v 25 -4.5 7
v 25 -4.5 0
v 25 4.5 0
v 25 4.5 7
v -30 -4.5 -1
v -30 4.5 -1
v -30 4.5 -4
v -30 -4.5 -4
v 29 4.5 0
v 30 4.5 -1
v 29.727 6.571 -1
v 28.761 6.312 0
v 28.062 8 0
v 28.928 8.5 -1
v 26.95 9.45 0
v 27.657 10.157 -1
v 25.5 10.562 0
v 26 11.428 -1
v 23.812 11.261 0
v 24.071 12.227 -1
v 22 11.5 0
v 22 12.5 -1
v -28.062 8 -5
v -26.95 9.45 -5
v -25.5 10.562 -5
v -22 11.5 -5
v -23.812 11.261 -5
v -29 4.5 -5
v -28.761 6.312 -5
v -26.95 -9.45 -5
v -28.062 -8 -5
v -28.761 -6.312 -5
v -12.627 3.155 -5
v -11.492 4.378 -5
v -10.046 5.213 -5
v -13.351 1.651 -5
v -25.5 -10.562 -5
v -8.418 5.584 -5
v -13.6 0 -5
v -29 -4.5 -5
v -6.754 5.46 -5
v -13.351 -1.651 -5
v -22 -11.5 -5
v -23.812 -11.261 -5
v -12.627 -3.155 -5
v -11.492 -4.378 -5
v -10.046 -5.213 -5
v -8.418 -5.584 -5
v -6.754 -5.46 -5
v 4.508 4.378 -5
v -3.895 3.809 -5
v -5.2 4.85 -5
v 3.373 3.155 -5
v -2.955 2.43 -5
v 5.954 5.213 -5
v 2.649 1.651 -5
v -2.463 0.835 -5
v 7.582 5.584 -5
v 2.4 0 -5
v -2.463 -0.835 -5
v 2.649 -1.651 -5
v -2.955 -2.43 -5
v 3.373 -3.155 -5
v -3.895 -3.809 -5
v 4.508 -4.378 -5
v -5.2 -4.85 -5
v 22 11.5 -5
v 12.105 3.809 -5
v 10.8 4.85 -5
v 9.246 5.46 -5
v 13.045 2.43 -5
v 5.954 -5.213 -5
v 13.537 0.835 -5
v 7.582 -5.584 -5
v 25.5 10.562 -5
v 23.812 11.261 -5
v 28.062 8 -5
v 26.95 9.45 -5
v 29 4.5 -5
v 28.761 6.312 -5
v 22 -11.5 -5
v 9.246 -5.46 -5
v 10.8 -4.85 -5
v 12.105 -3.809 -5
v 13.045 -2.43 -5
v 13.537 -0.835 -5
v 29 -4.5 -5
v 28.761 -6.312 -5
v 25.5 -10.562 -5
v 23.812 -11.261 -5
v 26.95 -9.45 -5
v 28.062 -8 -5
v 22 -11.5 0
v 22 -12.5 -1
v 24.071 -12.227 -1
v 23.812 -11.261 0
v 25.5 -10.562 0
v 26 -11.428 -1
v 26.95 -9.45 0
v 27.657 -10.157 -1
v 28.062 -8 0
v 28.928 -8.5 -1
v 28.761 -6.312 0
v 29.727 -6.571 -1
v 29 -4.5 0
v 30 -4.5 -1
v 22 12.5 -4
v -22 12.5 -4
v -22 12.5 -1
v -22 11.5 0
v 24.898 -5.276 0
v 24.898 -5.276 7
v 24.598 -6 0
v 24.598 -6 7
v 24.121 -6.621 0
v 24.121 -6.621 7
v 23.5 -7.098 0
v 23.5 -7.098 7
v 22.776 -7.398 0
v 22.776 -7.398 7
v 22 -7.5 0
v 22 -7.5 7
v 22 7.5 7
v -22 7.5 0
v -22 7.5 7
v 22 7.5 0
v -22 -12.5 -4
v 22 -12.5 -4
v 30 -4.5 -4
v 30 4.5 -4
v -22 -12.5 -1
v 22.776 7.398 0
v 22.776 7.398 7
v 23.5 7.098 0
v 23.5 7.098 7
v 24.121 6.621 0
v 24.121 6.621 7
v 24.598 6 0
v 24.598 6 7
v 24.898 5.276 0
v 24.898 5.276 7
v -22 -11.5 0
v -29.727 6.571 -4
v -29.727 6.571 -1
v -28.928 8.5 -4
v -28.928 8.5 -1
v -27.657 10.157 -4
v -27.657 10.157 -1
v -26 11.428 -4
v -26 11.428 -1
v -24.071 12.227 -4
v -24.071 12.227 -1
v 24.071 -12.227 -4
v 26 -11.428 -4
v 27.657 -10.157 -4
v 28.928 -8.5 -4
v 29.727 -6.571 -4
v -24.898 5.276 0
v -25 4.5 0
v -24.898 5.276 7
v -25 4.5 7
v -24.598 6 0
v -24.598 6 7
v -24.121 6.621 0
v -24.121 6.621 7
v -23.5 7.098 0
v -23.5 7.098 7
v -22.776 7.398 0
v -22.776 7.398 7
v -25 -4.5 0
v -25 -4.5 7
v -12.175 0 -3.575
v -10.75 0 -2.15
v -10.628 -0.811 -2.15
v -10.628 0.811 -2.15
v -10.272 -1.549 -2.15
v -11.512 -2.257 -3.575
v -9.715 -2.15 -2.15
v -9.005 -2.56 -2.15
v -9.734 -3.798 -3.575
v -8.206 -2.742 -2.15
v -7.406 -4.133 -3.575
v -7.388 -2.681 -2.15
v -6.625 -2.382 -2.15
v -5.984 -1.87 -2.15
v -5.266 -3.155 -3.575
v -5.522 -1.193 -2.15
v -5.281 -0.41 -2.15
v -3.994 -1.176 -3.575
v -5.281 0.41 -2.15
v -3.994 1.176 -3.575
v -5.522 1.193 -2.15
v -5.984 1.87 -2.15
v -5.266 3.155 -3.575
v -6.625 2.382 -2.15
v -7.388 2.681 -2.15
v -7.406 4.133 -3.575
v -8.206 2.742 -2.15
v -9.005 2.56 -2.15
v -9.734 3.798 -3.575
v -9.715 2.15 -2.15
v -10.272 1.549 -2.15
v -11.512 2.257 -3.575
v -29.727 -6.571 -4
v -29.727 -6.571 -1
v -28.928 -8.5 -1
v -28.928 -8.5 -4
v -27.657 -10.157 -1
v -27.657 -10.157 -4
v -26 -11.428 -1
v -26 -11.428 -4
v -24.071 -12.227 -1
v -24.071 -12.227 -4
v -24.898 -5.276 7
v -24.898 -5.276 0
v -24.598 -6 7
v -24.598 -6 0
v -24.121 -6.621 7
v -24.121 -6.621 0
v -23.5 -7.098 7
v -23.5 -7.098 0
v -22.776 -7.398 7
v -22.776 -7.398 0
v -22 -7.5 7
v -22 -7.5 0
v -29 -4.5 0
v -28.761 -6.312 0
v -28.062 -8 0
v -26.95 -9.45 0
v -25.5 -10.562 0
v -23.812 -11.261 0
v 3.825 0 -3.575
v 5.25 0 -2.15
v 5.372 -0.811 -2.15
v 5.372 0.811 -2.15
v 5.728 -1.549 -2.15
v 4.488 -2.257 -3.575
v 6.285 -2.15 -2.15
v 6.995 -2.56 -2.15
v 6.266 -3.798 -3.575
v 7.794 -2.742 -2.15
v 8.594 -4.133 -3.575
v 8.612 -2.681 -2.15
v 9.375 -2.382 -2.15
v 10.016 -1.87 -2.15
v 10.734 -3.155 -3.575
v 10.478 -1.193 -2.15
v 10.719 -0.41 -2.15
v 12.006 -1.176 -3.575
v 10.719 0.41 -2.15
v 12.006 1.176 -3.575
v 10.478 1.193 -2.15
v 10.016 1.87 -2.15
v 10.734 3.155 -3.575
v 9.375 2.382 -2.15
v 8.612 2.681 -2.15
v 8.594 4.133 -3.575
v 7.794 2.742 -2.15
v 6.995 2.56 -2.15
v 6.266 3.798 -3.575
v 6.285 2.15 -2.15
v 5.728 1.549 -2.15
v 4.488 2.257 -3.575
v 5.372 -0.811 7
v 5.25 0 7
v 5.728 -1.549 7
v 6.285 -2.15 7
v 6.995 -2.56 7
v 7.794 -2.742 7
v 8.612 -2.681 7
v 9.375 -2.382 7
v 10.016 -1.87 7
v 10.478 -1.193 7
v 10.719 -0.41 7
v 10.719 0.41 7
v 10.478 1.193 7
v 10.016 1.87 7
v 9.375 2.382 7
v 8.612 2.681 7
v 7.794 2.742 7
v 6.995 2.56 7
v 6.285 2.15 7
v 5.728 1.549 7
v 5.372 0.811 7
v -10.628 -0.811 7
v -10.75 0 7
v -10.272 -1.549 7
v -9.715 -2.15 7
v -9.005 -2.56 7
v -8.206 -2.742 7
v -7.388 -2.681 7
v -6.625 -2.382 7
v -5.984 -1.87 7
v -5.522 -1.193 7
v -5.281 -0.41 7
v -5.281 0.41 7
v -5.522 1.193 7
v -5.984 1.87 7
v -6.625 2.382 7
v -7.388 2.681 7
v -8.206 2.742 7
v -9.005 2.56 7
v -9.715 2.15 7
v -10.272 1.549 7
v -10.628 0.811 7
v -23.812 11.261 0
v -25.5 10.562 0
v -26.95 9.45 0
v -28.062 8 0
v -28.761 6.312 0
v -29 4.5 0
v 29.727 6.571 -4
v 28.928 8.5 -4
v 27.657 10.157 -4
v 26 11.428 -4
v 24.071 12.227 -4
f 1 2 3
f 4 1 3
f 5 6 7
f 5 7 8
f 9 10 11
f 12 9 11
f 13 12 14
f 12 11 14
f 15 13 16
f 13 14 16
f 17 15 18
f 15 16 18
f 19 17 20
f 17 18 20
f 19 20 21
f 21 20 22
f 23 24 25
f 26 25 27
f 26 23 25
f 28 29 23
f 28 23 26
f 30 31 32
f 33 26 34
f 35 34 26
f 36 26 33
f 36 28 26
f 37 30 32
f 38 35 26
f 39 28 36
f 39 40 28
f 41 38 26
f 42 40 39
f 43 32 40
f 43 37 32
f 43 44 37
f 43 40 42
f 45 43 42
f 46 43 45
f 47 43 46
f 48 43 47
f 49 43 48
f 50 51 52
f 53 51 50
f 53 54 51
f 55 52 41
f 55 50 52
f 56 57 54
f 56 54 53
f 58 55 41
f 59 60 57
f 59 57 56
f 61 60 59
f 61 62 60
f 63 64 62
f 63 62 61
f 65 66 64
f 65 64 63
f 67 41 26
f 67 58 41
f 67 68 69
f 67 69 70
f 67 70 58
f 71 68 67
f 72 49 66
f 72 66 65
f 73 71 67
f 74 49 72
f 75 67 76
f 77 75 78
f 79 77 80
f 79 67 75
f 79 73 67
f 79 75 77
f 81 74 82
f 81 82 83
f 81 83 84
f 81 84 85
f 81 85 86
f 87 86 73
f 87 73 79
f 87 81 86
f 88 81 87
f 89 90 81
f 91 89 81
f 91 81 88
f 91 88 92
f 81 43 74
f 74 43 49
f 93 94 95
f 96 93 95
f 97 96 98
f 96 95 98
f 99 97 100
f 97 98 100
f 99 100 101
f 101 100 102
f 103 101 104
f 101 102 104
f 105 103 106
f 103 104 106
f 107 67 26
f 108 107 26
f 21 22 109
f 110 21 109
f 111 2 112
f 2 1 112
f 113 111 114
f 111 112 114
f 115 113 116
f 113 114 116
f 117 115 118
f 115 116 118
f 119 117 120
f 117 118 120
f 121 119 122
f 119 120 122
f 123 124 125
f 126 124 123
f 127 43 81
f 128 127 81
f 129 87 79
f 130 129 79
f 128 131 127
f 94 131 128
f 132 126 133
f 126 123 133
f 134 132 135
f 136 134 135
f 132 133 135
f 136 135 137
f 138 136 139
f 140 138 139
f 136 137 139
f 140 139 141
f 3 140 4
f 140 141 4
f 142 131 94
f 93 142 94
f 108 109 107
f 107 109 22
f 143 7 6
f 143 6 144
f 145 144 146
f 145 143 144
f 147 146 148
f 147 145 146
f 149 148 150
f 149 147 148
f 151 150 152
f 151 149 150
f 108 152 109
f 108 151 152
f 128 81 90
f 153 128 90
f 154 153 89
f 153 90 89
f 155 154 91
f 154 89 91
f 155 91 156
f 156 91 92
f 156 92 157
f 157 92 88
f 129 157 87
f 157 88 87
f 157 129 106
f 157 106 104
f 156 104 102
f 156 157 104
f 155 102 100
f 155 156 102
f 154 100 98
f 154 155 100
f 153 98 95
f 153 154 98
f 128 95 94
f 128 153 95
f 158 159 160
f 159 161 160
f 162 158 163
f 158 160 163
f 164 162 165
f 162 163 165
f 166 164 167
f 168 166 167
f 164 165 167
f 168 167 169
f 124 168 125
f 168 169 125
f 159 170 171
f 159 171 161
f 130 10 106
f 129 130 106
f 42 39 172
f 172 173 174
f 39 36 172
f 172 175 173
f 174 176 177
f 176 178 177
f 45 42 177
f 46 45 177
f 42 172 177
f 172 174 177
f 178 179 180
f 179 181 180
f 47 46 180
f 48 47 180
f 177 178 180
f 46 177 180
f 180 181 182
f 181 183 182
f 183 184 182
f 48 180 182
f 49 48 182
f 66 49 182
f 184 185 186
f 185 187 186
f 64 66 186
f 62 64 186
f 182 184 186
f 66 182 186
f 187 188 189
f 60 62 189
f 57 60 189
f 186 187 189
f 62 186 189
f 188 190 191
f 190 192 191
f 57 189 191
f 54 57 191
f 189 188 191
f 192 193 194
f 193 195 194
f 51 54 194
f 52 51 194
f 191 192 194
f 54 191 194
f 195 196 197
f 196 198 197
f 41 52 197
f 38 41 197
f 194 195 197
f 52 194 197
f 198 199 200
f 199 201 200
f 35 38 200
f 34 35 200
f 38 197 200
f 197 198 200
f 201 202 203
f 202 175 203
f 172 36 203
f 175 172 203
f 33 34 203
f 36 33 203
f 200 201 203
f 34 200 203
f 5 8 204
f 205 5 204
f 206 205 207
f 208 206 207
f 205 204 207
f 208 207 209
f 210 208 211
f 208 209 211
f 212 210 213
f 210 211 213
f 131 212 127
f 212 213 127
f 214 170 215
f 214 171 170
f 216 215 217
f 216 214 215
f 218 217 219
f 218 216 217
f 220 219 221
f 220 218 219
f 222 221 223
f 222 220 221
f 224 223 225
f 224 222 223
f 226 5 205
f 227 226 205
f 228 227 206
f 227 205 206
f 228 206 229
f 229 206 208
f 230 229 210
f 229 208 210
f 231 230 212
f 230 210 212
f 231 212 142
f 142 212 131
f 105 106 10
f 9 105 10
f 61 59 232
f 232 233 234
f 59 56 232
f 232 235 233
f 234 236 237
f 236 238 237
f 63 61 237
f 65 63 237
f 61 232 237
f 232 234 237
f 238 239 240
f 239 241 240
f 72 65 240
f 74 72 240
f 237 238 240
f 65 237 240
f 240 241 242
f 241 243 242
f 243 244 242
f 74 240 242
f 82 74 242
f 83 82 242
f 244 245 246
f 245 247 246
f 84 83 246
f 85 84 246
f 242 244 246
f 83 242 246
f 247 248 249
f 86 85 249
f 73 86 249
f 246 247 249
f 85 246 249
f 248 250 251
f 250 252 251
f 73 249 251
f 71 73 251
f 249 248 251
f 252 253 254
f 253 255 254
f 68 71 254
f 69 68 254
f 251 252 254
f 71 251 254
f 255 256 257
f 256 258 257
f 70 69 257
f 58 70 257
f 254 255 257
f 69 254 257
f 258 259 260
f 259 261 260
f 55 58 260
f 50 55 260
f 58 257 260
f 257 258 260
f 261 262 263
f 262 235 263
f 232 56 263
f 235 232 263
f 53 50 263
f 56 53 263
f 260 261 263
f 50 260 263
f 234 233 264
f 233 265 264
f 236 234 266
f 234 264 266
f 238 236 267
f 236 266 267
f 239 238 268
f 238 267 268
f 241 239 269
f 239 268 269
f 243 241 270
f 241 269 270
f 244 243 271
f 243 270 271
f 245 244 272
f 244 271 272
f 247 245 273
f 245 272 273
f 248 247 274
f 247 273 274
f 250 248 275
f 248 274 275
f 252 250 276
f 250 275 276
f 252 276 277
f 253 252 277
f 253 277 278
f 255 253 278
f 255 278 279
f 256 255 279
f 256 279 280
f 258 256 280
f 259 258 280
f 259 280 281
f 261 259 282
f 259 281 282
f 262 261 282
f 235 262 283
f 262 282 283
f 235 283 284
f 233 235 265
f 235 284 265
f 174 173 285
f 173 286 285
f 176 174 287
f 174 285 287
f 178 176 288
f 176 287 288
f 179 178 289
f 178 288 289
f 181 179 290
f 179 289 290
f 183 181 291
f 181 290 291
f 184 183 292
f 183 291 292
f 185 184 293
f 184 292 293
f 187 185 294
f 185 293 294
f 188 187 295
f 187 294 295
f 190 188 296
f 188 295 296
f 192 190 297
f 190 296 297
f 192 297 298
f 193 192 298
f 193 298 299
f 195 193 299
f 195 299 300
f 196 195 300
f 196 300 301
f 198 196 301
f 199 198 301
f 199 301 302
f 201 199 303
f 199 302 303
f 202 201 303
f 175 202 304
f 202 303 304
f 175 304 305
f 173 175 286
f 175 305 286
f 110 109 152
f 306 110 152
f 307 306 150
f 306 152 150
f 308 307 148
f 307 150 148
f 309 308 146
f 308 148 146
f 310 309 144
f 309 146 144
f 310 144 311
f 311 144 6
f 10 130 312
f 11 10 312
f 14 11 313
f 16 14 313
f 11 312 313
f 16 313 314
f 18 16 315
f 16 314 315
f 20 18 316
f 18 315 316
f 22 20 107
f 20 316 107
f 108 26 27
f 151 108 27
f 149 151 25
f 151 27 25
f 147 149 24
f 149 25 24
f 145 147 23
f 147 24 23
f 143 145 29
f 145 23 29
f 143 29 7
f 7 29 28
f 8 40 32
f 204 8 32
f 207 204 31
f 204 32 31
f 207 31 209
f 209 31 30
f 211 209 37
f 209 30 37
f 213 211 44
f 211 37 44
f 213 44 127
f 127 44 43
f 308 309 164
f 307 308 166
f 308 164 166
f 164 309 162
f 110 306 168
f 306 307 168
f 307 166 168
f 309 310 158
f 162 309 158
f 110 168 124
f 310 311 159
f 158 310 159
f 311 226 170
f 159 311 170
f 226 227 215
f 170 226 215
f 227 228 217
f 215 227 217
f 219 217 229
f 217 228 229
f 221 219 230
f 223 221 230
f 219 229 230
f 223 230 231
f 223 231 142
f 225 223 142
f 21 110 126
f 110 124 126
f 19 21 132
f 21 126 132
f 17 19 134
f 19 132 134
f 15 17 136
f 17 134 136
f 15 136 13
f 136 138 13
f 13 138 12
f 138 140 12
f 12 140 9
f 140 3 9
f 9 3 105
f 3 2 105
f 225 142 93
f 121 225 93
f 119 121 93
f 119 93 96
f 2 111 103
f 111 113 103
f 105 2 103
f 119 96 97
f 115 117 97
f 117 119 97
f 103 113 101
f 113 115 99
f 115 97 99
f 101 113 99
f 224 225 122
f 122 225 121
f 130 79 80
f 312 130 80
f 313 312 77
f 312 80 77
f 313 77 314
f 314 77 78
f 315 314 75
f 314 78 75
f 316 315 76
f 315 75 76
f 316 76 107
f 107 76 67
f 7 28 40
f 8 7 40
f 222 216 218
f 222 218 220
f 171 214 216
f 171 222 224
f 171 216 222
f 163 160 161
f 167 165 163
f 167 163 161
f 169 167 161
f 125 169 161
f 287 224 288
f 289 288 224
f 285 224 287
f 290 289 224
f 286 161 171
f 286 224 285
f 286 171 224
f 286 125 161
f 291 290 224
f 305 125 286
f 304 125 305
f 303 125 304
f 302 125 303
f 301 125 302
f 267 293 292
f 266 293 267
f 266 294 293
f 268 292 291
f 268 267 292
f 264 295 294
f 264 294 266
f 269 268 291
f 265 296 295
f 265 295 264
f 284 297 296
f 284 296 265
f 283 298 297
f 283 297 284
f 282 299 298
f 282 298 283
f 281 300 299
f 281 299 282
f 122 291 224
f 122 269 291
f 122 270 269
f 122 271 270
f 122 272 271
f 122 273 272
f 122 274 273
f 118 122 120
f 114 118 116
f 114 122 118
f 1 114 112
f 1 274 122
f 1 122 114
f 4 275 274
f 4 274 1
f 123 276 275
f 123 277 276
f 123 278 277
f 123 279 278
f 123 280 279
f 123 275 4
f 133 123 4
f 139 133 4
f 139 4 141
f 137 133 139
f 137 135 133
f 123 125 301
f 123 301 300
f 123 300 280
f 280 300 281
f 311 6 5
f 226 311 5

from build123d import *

# Parameters (mm, degrees)
F0_W           = 50
F0_H           = 15
F1_DEPTH       = 7
F2_W           = 60
F2_H           = 25
F2_W_2         = 50
F2_H_2         = 15
F3_DEPTH       = 5
F5_D           = 5.5
F5_CSINK_D     = 11.2
F5_CSINK_ANGLE = 90
F6_R           = 8
F7_R           = 3
F8_SIZE        = 1


with BuildPart() as f1:
    # F0 (on Top) → F1 (new body)
    with BuildSketch(Plane.XY):
        Rectangle(F0_W, F0_H)
    extrude(amount=F1_DEPTH)

    # F2 (on face) → F3 (join)
    with BuildSketch(Plane(origin=(0, 0, 0), x_dir=(1, 0, 0), z_dir=(0, 0, -1))):
        Rectangle(F2_W, F2_H)
        Rectangle(F2_W_2, F2_H_2, mode=Mode.SUBTRACT)
        Rectangle(F2_W_2, F2_H_2)
    extrude(amount=F3_DEPTH)

    # F5 (through all)
    with Locations(Plane(origin=(0, 0, -5), x_dir=(1, 0, 0), z_dir=(0, 0, -1))):
        with Locations((-8, 0), (8, 0)):
            CounterSinkHole(F5_D / 2, F5_CSINK_D / 2, counter_sink_angle=F5_CSINK_ANGLE)

    # F6
    f6_edges = [f1.edges().sort_by_distance(p)[0] for p in [
        (-30, -12.5, -2.5),
        (-30, 12.5, -2.5),
        (30, -12.5, -2.5),
        (30, 12.5, -2.5),
    ]]
    fillet(f6_edges, radius=F6_R)

    # F7
    f7_edges = [f1.edges().sort_by_distance(p)[0] for p in [
        (25, -7.5, 3.5),
        (25, 7.5, 3.5),
        (-25, 7.5, 3.5),
        (-25, -7.5, 3.5),
    ]]
    fillet(f7_edges, radius=F7_R)

    # F8
    f8_edges = [f1.edges().sort_by_distance(p)[0] for p in [
        (0, -12.5, -5),
        (30, 0, -5),
        (0, 12.5, -5),
        (-30, 0, -5),
        (-30, 0, 0),
        (0, 12.5, 0),
        (30, 0, 0),
        (0, -12.5, 0),
    ]]
    chamfer(f8_edges, length=F8_SIZE)


solid = f1.part
